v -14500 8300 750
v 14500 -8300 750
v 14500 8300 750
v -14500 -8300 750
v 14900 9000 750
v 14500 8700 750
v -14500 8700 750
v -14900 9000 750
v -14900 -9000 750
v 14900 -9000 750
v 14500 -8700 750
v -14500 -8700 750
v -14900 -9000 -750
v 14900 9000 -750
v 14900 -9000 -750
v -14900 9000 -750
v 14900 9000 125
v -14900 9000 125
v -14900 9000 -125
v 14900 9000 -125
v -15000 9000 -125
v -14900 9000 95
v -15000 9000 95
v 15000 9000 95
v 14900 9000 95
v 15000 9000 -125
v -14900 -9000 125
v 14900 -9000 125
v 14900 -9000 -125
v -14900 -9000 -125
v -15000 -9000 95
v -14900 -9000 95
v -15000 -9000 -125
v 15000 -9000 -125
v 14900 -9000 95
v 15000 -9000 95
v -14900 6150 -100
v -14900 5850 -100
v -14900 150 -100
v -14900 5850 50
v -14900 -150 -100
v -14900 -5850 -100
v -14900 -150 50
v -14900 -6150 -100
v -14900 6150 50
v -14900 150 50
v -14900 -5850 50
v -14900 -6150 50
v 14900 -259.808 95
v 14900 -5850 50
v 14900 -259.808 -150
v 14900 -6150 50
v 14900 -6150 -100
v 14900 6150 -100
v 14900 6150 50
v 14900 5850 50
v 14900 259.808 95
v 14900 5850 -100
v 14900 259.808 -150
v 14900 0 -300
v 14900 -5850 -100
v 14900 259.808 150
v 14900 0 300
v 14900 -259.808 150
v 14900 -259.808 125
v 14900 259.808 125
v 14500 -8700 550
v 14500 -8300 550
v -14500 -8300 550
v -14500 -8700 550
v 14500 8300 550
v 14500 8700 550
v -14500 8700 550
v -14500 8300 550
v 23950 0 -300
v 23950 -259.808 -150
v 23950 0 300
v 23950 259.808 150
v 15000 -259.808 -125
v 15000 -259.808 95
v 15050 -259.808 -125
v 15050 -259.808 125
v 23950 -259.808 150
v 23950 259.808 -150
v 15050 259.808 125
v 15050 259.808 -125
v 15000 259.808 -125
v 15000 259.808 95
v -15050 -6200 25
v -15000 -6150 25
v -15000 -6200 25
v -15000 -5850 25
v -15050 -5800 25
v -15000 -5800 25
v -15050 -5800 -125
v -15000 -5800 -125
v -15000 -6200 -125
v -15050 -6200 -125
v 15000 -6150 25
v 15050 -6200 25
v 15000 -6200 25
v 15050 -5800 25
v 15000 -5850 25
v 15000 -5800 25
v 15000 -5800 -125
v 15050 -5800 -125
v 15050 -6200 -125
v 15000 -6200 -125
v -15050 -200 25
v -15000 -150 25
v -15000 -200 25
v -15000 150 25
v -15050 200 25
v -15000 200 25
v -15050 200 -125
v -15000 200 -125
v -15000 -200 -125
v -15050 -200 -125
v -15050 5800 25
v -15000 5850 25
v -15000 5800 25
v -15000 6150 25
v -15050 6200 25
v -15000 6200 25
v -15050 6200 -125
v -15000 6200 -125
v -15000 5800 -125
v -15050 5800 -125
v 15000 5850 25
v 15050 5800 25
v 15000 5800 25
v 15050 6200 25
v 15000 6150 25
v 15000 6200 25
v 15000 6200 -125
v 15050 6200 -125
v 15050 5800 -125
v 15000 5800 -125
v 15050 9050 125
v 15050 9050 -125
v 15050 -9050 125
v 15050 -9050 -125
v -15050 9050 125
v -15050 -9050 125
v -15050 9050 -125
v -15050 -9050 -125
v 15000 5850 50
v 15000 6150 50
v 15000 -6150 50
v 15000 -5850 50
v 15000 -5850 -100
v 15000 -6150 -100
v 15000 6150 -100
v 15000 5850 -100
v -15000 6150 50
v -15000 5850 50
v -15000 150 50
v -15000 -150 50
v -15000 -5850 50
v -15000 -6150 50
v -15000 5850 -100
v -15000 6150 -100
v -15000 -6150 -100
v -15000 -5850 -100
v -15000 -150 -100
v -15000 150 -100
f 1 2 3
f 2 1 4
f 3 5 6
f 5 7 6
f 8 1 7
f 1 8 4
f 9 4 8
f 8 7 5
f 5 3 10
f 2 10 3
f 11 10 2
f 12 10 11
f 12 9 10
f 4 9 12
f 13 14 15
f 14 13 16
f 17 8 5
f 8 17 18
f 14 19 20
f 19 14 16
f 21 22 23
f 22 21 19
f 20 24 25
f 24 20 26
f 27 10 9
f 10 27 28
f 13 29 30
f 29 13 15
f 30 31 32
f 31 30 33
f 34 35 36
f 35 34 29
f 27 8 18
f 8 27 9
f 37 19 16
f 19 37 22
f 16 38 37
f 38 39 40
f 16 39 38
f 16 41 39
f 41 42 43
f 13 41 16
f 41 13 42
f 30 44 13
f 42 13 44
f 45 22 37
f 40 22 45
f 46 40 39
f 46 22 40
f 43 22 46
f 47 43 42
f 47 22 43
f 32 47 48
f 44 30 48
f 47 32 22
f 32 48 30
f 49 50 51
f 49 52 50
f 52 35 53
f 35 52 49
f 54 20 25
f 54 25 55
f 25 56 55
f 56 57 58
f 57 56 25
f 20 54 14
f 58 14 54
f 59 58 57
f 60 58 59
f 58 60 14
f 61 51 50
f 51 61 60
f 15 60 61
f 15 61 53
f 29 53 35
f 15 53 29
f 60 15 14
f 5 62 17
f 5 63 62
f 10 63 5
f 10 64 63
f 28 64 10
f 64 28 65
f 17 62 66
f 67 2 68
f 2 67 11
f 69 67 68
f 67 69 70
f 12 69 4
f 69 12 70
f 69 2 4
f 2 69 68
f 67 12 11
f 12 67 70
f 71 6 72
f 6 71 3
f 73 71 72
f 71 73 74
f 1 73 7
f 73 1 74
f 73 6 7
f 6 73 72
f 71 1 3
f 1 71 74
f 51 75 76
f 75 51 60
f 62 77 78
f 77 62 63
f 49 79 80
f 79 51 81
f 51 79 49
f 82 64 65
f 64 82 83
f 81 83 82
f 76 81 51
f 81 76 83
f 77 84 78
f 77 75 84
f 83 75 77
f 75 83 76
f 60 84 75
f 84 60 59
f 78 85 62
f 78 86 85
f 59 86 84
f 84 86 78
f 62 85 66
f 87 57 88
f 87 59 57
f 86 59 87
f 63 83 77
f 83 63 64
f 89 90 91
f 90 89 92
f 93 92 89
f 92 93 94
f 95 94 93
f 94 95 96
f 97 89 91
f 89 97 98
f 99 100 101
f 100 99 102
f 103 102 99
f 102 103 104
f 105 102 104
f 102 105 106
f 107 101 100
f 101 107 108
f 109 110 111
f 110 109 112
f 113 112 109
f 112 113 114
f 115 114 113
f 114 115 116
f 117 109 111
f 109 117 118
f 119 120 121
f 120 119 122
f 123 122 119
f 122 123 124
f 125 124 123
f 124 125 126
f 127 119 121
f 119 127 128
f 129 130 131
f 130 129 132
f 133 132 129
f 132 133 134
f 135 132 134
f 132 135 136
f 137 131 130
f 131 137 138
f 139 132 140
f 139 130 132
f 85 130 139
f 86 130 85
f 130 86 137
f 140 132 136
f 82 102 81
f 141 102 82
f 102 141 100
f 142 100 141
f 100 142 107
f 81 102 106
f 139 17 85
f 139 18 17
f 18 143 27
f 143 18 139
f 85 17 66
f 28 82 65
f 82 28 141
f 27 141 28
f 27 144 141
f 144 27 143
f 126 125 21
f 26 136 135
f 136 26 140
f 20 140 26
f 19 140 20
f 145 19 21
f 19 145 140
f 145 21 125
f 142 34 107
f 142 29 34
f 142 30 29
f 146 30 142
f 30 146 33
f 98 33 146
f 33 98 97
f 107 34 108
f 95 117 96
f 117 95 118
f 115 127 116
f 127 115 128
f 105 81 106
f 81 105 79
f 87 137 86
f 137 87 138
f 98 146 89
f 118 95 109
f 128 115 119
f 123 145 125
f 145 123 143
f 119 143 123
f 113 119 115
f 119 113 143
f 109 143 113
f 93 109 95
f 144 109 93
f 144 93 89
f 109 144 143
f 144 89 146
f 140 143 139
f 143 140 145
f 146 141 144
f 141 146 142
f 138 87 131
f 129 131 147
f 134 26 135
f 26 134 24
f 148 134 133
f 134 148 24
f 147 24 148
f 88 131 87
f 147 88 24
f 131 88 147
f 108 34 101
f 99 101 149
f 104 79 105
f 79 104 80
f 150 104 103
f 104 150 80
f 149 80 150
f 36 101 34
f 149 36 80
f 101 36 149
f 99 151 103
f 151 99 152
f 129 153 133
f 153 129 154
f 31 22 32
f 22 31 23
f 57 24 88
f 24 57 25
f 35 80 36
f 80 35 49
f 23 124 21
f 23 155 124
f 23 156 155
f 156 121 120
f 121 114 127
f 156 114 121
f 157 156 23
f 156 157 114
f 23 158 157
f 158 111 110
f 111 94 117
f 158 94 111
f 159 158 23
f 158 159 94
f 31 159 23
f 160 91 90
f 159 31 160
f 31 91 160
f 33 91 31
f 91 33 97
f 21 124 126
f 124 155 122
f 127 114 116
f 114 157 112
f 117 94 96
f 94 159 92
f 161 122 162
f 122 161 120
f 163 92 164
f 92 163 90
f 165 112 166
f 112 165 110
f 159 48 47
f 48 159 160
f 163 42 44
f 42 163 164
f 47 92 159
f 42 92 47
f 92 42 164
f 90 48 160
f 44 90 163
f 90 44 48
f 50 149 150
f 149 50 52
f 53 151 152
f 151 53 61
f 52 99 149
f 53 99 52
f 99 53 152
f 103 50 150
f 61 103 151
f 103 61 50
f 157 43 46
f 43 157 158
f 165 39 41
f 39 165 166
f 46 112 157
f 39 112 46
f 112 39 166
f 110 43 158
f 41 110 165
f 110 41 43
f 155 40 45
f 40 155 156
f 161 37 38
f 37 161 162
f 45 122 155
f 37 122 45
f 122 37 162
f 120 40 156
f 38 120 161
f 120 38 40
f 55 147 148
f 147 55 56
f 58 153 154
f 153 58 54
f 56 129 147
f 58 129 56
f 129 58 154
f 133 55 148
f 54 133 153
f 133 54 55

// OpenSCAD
// file: carrier_deck.scad
// =========================================================================
// GRUMMAN-STYLED EMERGENCY INFLATABLE CARRIER - FLATBED FLUSH-DECK PLATFORM
// MANUFACTURER: HUNTINGTON INGALLS / NEWPORT NEWS SHIPBUILDING
// MECHANICAL BLUEPRINT SPECIFICATION: ACCORDION LANDING PLATFORM
// =========================================================================

module carrier_plate_module(length=30000, width=18000, thickness=1500) {
    difference() {
        // Main Flatbed Drop-Stitch Slab Core (No Tower, No Turret Obstructions)
        cube([length, width, thickness], center=true);
        
        // Passive Hinge Clearances for Accordion-Style Stacking
        translate([-length/2, 0, 0])
            cube([200, width+10, thickness+10], center=true);
        translate([length/2, 0, 0])
            cube([200, width+10, thickness+10], center=true);
            
        // Integrated Low-Profile Left/Right Sump Trenches for Bilge Collection
        translate([0, -width/2 + 500, thickness/2 - 100])
            cube([length - 1000, 400, 200], center=true);
        translate([0, width/2 - 500, thickness/2 - 100])
            cube([length - 1000, 400, 200], center=true);
    }
    
    // Huntington Ingalls Gravity-Drop Tongue-and-Groove Passive Interlocks
    translate([length/2 - 50, 0, 0])
        tongue_interlock_joint(width);
}

module tongue_interlock_joint(joint_width) {
    // Solid wedge joint profile that jams locked under gravity drop action
    rotate([0, 90, 0])
        cylinder(h=100, r=300, h=joint_width, center=true, $fn=6);
}

// Render primary operational flatbed segment
carrier_plate_module();
// main file
// =========================================================================
// GRUMMAN-STYLED INFLATABLE CARRIER - TITANIUM LID WITH STORAGE LATCHES
// MANUFACTURER: HUNTINGTON INGALLS / NEWPORT NEWS SHIPBUILDING
// MATERIAL PROFILE: GRADE 5 TITANIUM ENCLOSURE WITH MECHANICAL HOOKS
// =========================================================================

include <carrier_deck.scad>

// Standard Titanium Lid Dimensions
length = 30000;
width = 18000;
thickness = 250; 

module titanium_carrier_top_lid_v2(l=length, w=width, t=thickness) {
    difference() {
        // Main Protective Shell Plane (Ti-6Al-4V)
        cube([l + 100, w + 100, t], center=true);
        
        // Internal Pocket Clearance for Vacuum-Flattened Accordion Plates
        translate([0, 0, -30])
            cube([l, w, t], center=true);
            
        // Parametric Cutouts for Internal Vacuum Storage Latch Mounts
        for (y_offset = [-w/3 : w/3 : w/3]) {
            translate([-l/2 + 50, y_offset, -t/2 + 50]) cube([300, 400, 200], center=true);
            translate([l/2 - 50, y_offset, -t/2 + 50])  cube([300, 400, 200], center=true);
        }
    }
    
    // Add Solid Titanium Latch Hooks inside the Mount Wells
    for (y_offset = [-w/3 : w/3 : w/3]) {
        translate([-l/2 + 50, y_offset, -t/2 + 100]) storage_latch_hook();
        translate([l/2 - 50, y_offset, -t/2 + 100])  rotate([0, 0, 180]) storage_latch_hook();
    }
}

module storage_latch_hook(hook_w=300, hook_h=150) {
    // Rigid wedge profiles that drop lock over the edges of the flattened plates
    union() {
        cube([100, hook_w, hook_h], center=true);
        translate([100, 0, hook_h/2 - 25]) cube([200, hook_w, 50], center=true);
    }
}

// Instantiate upgraded Titanium Top Lid
titanium_carrier_top_lid_v2();
